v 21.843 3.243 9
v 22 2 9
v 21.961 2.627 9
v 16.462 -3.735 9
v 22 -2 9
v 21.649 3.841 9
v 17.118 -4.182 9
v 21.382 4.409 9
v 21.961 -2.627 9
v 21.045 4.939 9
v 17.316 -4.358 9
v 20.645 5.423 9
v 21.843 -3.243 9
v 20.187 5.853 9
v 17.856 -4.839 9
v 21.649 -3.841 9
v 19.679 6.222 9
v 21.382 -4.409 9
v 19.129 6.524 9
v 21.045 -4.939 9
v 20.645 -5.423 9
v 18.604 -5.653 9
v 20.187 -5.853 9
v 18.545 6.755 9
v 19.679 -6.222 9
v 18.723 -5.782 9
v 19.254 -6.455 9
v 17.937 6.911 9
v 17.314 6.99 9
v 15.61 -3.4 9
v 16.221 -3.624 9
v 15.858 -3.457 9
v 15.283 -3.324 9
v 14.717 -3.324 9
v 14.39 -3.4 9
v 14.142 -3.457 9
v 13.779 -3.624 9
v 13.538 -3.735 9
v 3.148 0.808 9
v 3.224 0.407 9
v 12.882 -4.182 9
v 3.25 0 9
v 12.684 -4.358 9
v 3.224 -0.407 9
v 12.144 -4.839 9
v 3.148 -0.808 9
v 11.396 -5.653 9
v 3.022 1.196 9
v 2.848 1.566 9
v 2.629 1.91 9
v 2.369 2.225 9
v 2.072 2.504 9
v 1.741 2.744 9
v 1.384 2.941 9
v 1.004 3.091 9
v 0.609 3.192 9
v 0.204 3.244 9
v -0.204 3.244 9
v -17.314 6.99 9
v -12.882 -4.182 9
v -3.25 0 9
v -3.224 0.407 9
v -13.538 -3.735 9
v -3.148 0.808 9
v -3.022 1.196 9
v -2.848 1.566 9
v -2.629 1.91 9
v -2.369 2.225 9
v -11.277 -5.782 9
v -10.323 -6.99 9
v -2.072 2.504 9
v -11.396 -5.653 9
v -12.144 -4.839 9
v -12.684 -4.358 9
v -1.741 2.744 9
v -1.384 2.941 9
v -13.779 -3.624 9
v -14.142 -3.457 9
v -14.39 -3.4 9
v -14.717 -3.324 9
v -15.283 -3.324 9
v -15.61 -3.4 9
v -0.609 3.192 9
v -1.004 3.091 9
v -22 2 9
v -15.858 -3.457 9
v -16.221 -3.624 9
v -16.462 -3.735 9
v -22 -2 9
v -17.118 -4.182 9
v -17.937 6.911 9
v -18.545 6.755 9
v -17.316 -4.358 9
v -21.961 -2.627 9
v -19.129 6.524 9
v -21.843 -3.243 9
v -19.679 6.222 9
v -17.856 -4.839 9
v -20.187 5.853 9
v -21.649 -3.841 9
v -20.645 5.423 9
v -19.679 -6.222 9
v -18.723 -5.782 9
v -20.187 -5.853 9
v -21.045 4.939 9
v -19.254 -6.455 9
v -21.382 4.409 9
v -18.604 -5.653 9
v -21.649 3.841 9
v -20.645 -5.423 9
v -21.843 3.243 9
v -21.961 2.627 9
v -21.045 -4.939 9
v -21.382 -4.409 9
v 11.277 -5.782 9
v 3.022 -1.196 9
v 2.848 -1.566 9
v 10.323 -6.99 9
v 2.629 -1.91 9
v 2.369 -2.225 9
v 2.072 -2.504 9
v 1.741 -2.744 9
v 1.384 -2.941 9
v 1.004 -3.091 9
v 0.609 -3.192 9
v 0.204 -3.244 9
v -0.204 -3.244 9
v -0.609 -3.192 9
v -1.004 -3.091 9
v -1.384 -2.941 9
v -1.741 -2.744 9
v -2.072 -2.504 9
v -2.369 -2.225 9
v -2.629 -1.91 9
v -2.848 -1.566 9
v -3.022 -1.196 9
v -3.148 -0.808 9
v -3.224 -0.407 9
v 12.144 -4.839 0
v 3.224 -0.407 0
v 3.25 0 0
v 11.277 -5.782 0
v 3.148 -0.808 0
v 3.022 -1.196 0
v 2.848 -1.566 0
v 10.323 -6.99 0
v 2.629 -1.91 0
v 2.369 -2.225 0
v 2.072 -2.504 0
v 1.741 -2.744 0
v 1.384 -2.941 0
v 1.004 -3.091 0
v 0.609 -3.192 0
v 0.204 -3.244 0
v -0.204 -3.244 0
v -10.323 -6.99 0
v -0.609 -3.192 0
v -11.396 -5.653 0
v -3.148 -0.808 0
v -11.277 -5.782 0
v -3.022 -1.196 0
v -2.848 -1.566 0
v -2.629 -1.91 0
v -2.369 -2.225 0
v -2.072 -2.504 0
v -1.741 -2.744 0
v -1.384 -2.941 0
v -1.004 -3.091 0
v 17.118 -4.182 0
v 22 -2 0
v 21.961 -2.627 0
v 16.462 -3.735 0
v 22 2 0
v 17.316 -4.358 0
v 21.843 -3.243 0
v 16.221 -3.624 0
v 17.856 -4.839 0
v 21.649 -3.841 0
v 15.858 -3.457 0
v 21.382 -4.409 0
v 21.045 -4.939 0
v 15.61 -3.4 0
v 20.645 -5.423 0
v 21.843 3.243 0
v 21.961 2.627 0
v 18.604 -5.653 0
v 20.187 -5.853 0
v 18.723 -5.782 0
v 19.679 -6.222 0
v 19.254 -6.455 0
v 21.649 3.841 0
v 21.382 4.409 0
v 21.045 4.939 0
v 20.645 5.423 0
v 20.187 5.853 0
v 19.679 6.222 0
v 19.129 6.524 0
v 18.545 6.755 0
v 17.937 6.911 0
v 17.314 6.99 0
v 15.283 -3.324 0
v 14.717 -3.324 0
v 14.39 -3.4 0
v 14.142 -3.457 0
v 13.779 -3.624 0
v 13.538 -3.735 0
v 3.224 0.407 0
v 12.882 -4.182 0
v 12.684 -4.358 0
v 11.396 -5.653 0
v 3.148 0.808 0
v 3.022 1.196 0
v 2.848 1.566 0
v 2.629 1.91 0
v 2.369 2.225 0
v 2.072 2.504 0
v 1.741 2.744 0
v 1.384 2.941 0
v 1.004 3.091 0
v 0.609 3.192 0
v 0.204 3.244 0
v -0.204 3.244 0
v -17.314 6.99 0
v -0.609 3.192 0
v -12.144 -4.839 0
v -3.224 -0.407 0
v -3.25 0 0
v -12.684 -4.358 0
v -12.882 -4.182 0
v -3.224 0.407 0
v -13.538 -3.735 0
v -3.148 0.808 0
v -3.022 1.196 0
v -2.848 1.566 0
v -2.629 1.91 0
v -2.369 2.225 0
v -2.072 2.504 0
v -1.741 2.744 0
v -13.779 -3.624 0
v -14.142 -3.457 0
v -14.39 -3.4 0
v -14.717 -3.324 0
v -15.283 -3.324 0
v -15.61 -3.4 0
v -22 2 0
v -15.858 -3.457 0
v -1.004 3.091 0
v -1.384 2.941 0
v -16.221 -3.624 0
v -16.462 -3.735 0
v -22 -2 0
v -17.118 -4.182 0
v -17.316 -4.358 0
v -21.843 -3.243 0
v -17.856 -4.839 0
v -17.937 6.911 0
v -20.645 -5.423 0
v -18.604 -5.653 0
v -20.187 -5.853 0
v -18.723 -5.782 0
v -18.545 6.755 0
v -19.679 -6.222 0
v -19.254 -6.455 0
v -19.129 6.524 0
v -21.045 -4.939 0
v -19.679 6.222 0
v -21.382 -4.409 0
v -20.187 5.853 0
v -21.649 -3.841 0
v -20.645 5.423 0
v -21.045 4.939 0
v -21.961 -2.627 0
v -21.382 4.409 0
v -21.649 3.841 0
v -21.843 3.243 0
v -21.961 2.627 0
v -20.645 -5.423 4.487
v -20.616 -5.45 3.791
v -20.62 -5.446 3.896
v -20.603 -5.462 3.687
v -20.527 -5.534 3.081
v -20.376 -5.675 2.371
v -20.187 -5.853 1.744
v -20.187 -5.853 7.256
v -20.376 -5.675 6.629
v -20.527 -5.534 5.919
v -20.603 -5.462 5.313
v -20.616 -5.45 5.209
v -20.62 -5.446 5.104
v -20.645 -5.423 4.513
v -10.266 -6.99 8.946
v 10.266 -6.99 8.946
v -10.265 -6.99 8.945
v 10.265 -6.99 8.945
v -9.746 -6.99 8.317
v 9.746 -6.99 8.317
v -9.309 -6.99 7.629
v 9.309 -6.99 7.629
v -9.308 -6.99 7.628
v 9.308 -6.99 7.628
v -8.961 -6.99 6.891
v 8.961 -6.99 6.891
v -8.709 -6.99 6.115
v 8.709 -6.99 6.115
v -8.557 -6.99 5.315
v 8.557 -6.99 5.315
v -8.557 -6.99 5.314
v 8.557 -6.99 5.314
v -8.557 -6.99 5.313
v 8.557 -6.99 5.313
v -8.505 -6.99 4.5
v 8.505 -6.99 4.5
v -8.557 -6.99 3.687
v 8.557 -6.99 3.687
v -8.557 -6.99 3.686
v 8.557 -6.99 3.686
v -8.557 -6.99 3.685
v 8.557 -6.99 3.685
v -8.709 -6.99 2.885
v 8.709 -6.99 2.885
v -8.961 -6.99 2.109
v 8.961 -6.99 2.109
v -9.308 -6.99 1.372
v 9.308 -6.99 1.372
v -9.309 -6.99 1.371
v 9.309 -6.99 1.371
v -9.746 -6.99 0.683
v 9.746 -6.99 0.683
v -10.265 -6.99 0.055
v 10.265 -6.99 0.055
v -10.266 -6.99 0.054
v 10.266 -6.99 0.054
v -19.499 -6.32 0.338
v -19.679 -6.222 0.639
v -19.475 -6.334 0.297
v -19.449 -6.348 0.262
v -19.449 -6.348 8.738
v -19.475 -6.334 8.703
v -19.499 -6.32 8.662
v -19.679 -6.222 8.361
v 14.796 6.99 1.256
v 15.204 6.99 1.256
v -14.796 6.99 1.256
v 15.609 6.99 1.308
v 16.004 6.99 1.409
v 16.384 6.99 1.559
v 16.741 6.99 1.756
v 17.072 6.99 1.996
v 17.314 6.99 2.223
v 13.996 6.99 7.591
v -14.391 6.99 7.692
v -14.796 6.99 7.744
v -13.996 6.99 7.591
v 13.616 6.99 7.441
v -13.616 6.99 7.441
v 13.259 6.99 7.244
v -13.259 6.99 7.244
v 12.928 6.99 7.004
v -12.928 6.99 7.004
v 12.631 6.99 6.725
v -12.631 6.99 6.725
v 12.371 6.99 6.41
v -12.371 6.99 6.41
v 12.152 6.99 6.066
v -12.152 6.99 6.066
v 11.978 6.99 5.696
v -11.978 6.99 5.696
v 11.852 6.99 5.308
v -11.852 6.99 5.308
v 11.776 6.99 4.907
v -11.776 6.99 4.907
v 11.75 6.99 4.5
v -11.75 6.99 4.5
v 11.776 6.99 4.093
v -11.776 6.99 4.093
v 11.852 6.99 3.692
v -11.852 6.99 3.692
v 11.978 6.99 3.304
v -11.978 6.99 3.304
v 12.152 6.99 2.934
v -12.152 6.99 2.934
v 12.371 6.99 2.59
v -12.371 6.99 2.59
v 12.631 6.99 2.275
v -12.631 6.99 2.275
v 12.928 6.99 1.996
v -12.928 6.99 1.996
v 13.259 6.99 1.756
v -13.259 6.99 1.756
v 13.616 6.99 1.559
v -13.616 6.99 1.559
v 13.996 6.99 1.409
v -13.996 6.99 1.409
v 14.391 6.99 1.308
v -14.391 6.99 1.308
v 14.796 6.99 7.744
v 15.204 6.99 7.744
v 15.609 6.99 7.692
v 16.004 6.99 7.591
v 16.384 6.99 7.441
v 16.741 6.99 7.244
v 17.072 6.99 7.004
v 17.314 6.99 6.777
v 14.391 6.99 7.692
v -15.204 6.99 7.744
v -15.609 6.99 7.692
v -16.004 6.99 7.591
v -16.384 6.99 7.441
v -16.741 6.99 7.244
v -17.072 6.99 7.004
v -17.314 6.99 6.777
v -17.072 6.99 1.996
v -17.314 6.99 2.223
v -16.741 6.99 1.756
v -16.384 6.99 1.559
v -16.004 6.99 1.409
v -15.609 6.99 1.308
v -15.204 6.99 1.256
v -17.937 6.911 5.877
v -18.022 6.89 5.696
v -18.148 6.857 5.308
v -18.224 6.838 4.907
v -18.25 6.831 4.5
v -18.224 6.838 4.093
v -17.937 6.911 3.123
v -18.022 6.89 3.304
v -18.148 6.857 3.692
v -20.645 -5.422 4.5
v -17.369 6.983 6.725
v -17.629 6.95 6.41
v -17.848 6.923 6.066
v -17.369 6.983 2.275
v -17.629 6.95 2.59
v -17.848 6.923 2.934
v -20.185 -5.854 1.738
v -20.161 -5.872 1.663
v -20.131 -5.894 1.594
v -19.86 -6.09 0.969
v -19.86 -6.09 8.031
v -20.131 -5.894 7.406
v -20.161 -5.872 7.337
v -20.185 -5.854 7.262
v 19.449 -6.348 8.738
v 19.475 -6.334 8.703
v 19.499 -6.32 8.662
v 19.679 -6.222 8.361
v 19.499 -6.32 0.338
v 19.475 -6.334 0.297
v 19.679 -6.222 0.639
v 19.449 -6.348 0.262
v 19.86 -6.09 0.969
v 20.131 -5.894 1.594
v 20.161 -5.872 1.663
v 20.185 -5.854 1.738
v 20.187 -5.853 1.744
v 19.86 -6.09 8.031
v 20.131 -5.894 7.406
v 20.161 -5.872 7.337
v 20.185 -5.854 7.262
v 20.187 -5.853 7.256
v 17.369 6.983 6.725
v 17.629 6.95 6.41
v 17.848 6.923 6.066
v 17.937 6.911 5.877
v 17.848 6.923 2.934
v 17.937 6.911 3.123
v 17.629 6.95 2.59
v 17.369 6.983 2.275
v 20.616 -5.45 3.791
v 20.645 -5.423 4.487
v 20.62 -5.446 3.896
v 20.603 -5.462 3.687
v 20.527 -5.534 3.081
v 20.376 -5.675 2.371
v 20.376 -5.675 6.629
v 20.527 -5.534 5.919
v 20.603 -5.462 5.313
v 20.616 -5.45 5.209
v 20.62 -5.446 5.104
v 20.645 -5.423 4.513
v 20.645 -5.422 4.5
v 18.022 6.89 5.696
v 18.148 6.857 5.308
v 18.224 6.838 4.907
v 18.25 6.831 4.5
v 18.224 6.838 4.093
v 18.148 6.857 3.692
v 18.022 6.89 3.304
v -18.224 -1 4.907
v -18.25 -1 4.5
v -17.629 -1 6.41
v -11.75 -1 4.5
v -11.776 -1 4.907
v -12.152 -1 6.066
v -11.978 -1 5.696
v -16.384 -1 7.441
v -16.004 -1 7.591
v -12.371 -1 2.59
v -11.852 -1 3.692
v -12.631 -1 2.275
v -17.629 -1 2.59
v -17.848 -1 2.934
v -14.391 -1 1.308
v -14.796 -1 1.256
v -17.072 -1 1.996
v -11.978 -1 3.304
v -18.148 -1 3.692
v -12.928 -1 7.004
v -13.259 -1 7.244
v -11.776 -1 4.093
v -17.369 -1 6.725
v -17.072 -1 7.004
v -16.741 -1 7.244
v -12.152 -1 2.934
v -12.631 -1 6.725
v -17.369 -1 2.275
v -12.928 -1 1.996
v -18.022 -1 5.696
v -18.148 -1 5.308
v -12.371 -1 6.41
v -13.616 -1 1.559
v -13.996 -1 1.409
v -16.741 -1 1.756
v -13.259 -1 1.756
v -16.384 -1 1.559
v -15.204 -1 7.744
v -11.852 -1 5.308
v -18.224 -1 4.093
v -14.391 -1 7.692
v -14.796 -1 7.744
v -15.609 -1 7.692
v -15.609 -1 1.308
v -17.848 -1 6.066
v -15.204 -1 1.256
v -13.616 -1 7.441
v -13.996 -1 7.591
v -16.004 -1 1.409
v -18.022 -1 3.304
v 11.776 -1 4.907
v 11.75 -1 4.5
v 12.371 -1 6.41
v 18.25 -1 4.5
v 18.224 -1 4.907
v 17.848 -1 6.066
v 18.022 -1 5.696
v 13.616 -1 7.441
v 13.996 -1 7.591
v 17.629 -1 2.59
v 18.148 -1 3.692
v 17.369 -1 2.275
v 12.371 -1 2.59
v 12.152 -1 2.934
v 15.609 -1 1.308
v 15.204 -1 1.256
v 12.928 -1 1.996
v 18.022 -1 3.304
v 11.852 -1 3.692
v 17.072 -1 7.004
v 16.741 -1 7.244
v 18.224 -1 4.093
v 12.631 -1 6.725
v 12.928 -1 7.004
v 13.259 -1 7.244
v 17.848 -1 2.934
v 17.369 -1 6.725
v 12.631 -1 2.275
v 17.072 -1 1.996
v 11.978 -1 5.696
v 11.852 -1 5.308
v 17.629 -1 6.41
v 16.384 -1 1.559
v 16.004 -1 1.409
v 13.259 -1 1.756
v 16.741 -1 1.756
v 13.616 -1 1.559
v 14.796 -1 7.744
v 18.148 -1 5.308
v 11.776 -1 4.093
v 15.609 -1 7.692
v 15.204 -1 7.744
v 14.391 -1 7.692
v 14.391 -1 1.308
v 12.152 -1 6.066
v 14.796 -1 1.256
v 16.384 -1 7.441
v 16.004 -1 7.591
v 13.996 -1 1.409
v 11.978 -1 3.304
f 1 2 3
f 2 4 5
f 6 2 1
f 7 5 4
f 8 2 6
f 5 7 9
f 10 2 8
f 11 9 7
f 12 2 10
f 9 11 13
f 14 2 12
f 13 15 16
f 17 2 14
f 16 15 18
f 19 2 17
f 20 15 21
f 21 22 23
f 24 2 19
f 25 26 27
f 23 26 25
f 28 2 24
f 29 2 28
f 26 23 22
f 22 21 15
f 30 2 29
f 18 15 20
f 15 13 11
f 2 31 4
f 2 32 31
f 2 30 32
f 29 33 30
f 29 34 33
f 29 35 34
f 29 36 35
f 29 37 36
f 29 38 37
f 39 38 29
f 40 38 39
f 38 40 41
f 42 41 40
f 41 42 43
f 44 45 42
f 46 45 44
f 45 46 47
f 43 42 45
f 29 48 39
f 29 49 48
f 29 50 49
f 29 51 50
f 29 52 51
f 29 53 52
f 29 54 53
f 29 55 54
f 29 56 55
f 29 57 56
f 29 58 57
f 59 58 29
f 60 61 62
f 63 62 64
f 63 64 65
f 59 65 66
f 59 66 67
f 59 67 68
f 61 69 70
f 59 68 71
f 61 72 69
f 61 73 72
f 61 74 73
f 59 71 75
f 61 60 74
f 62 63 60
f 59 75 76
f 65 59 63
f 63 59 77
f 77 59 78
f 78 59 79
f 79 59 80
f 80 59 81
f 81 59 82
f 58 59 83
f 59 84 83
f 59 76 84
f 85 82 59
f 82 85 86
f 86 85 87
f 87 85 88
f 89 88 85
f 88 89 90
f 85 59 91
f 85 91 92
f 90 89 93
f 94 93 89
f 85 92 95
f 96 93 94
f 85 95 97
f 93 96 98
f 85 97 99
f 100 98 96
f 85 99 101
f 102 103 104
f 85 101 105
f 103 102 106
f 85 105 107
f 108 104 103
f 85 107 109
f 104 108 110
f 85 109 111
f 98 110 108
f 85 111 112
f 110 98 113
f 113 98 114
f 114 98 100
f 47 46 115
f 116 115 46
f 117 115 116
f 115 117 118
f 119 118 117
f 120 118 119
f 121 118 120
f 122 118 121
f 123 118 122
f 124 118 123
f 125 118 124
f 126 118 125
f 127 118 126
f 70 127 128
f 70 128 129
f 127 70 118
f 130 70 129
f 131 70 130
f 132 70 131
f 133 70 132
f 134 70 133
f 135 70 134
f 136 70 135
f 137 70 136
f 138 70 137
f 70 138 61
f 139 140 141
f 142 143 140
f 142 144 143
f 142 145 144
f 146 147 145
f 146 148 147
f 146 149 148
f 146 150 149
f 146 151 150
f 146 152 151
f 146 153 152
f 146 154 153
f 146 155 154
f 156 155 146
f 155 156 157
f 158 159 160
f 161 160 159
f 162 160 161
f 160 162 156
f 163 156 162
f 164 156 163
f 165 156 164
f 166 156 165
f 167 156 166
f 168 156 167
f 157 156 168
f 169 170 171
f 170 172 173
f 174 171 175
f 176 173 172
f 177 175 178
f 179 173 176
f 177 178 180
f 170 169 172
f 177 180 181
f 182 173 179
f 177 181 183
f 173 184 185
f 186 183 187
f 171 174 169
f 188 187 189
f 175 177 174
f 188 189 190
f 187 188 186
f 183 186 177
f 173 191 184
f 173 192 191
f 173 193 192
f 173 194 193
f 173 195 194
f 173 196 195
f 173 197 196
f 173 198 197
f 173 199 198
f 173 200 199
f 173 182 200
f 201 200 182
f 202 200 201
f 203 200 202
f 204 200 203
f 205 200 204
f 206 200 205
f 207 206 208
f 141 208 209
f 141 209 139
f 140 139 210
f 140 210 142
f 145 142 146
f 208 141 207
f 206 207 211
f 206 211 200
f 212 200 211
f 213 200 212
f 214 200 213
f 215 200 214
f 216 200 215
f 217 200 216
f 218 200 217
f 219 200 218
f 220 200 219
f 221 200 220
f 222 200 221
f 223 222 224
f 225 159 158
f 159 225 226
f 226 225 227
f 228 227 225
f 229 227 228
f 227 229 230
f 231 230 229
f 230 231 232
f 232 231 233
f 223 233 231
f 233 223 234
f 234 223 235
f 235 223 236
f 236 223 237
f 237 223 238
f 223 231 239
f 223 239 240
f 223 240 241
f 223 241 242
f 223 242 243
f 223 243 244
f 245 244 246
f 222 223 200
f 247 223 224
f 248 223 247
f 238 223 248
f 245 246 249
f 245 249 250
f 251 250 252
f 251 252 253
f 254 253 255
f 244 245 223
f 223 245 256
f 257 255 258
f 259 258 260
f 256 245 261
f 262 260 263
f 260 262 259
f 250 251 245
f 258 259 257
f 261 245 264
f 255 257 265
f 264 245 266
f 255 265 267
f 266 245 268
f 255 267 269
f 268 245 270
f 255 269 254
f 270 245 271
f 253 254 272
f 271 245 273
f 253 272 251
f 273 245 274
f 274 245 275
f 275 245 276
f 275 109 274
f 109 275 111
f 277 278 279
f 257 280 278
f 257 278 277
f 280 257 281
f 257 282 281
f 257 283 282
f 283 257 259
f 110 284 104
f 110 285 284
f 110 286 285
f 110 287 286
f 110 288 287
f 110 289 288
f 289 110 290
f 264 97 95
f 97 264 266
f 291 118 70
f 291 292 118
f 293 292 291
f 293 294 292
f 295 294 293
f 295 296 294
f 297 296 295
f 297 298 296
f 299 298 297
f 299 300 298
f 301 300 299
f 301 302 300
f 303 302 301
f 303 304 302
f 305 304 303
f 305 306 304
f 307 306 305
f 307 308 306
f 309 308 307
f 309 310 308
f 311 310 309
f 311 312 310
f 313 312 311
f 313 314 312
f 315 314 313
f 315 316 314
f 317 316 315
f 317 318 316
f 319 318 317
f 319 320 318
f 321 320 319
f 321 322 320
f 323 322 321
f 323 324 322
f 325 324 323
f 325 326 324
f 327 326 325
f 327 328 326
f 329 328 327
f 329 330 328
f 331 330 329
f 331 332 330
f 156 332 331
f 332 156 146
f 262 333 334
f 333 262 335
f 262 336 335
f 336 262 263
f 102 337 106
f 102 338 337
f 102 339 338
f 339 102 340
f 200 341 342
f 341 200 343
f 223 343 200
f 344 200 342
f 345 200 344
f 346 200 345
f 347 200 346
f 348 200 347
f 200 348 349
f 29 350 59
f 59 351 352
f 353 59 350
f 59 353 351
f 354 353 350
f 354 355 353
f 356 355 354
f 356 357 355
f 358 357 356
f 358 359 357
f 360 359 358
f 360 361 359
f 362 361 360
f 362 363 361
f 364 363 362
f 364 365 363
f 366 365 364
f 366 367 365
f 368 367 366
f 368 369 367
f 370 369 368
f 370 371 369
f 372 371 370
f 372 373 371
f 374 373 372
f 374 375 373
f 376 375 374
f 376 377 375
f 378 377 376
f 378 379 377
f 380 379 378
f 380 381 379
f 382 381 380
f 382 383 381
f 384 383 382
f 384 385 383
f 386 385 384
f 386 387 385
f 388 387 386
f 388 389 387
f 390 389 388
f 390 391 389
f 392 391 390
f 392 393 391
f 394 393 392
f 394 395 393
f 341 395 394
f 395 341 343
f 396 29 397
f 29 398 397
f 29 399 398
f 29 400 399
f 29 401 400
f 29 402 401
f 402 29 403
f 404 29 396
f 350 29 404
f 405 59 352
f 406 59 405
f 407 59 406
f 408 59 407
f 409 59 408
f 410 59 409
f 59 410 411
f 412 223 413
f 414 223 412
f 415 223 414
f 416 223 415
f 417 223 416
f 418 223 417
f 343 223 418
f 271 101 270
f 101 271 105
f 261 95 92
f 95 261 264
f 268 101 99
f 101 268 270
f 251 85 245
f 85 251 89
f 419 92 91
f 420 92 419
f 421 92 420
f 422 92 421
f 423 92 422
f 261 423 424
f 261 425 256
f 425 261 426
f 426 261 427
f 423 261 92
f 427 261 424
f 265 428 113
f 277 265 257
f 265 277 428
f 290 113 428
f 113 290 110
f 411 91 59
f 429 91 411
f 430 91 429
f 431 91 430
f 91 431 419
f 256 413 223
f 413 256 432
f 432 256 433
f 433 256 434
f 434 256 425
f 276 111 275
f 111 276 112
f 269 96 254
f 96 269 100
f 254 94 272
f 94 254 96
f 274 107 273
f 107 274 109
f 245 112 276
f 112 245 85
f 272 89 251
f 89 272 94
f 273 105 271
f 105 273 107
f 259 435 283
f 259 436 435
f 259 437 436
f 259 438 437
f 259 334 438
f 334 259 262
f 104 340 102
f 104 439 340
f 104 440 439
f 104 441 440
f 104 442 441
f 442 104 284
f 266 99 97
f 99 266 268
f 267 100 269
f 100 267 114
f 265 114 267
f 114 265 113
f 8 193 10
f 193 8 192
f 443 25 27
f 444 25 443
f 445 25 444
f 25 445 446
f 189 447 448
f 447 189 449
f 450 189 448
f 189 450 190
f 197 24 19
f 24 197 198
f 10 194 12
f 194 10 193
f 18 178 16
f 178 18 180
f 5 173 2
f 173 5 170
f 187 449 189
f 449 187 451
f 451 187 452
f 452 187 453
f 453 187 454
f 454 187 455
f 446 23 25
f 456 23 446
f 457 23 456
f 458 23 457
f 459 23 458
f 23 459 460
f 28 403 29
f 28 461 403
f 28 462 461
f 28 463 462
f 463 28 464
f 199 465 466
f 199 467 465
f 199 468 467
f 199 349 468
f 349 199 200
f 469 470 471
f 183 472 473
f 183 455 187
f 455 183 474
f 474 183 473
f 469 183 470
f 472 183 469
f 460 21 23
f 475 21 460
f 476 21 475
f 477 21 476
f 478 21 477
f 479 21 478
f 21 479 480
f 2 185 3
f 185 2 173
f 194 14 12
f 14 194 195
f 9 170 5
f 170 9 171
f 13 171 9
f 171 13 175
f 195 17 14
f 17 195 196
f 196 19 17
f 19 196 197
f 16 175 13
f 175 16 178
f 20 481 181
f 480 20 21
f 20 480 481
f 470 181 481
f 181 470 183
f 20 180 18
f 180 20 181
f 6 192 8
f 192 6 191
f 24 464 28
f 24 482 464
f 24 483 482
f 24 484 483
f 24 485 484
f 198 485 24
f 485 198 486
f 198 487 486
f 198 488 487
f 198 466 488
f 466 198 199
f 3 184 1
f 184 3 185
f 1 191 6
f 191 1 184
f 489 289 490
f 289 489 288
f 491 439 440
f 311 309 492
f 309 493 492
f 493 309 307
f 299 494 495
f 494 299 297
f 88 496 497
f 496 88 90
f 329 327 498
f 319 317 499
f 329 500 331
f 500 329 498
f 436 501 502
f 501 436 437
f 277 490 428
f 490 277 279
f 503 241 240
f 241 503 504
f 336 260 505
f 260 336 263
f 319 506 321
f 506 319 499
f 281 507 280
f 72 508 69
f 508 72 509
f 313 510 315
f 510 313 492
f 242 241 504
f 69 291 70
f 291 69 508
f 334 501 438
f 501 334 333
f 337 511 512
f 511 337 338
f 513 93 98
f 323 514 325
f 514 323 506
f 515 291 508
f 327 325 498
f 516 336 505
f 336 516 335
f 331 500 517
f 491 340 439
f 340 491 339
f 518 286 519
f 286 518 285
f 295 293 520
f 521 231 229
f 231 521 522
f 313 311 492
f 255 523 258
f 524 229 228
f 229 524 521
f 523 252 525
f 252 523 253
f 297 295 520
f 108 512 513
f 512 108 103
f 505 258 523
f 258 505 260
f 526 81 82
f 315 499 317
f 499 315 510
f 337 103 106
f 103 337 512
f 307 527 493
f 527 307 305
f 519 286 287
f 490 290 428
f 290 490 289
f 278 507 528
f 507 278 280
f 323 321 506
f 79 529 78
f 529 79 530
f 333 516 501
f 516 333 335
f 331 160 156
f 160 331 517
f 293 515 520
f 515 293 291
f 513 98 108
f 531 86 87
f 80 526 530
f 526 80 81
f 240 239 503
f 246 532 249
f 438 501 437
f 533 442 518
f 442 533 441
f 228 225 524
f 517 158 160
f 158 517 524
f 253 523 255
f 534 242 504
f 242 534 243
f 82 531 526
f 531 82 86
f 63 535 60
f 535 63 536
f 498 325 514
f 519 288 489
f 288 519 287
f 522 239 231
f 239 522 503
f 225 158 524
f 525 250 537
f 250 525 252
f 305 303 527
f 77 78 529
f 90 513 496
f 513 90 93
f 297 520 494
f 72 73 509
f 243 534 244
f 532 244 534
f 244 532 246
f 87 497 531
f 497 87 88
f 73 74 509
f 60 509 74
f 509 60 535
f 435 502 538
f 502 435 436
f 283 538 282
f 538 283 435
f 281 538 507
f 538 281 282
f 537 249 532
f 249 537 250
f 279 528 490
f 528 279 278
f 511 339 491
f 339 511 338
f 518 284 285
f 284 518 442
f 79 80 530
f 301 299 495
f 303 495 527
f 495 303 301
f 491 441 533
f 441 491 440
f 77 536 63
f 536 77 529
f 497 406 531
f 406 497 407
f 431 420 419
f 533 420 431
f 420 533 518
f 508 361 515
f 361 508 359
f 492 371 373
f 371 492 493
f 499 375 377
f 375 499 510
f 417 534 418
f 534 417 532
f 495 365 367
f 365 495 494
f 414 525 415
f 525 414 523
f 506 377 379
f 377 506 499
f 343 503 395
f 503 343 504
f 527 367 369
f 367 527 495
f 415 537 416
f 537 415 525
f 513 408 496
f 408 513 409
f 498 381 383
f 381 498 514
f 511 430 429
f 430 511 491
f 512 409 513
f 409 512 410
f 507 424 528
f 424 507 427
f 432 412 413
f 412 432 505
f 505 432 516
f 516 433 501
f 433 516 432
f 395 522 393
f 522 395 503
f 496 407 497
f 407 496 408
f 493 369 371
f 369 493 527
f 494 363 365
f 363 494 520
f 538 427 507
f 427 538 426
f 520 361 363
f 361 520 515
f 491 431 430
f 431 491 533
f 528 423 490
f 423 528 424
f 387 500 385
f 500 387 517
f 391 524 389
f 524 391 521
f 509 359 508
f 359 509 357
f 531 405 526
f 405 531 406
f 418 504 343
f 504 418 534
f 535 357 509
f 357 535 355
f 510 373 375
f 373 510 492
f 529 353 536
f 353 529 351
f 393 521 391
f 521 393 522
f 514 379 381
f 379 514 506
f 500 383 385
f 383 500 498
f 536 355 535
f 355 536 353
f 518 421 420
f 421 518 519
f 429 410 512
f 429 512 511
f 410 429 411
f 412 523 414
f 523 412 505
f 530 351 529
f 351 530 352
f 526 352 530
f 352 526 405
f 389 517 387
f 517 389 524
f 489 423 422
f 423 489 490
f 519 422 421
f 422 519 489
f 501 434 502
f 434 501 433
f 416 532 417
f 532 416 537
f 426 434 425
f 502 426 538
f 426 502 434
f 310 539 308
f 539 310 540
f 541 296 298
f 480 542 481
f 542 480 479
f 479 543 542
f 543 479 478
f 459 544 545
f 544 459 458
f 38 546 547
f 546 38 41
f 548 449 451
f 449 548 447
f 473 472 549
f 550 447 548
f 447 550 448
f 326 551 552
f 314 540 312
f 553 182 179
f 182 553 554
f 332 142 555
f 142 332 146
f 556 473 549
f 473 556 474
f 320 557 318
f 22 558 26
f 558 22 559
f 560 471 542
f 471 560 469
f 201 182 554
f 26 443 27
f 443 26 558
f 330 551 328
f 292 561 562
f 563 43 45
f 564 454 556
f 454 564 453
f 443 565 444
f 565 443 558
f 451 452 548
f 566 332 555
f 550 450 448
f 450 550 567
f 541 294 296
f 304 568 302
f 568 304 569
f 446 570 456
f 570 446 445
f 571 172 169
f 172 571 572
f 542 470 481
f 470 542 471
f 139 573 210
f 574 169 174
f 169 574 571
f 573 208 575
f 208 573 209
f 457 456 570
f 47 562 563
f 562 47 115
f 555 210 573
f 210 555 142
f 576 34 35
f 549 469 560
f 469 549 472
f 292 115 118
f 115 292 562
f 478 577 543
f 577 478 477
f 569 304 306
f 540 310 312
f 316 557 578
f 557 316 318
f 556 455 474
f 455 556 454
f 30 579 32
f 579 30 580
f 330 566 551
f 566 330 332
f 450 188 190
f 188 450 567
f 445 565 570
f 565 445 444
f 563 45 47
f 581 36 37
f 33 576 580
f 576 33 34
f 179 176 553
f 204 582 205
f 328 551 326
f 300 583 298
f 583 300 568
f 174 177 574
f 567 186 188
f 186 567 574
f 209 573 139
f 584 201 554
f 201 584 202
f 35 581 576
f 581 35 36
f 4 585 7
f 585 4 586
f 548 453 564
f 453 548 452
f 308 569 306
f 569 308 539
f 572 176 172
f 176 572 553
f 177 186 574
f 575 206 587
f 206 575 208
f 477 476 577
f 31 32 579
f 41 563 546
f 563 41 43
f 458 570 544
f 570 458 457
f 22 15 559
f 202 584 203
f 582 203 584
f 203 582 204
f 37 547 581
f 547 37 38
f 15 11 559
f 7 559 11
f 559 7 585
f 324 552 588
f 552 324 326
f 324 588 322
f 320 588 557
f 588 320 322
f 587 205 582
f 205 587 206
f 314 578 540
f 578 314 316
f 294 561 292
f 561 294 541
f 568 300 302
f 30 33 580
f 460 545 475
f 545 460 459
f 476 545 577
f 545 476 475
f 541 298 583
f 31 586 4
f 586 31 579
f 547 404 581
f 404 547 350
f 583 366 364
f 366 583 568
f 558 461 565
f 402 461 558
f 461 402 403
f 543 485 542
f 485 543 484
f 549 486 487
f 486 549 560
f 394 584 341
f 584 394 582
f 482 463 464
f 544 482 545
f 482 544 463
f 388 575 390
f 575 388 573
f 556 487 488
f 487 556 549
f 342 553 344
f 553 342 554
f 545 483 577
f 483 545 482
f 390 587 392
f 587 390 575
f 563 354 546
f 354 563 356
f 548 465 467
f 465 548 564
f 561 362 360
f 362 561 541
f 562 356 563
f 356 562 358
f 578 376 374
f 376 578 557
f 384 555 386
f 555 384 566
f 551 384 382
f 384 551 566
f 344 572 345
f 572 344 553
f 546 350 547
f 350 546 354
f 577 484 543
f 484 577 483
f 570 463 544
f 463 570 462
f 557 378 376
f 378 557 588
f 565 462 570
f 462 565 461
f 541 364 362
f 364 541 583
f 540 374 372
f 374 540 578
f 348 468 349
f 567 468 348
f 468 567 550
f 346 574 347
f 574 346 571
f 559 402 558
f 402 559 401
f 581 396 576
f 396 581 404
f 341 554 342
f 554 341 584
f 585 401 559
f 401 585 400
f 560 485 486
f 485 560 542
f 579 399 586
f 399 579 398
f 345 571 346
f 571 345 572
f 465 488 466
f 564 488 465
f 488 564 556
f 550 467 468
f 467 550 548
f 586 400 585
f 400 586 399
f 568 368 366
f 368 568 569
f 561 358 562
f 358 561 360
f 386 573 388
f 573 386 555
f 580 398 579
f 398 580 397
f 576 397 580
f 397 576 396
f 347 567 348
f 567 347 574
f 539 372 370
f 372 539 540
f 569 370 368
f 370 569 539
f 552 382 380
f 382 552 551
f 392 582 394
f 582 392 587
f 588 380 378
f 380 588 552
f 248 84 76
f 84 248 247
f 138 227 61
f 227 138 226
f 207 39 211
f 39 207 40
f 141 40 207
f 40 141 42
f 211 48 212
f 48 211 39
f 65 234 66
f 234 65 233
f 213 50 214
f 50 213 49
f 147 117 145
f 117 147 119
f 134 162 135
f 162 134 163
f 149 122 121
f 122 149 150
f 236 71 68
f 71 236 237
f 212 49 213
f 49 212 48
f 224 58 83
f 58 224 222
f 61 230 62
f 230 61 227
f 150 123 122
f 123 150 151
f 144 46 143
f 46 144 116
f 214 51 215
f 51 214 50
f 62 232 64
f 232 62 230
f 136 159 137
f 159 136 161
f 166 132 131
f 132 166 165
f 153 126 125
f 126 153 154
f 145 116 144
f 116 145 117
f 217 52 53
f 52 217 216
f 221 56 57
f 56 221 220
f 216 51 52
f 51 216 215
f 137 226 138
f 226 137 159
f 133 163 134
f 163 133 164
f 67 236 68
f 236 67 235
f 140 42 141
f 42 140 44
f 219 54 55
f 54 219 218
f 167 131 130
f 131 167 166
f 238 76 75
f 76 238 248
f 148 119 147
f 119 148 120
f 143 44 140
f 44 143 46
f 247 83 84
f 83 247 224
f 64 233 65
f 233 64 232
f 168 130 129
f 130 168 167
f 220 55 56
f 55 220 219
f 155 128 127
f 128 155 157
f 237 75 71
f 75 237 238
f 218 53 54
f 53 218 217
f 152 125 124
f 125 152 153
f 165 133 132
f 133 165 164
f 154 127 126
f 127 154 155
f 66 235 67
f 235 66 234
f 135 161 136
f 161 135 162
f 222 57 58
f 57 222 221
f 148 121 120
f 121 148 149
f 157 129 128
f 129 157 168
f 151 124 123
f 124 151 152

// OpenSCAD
$fn = 50;


difference() {
	union() {
		cylinder(h = 9, r = 7.0000000000);
		translate(v = [-7.5000000000, 0.0000000000, 0]) {
			hull() {
				translate(v = [-9.5000000000, 2.0000000000, 0]) {
					cylinder(h = 9, r = 5);
				}
				translate(v = [9.5000000000, 2.0000000000, 0]) {
					cylinder(h = 9, r = 5);
				}
				translate(v = [-9.5000000000, -2.0000000000, 0]) {
					cylinder(h = 9, r = 5);
				}
				translate(v = [9.5000000000, -2.0000000000, 0]) {
					cylinder(h = 9, r = 5);
				}
			}
		}
		translate(v = [7.5000000000, 0.0000000000, 0]) {
			hull() {
				translate(v = [-9.5000000000, 2.0000000000, 0]) {
					cylinder(h = 9, r = 5);
				}
				translate(v = [9.5000000000, 2.0000000000, 0]) {
					cylinder(h = 9, r = 5);
				}
				translate(v = [-9.5000000000, -2.0000000000, 0]) {
					cylinder(h = 9, r = 5);
				}
				translate(v = [9.5000000000, -2.0000000000, 0]) {
					cylinder(h = 9, r = 5);
				}
			}
		}
	}
	union() {
		translate(v = [-15.0000000000, -7.0000000000, 4.5000000000]) {
			rotate(a = [90, 0, 0]) {
				difference() {
					union() {
						#translate(v = [0, 0, -14.0000000000]) {
							cylinder(h = 14, r = 2.2500000000);
						}
						#translate(v = [0, 0, -6]) {
							cylinder(h = 6, r1 = 3.2500000000, r2 = 6.5000000000);
						}
						#translate(v = [0, 0, -14.0000000000]) {
							cylinder(h = 14, r = 3.2500000000);
						}
						#translate(v = [0, 0, -14.0000000000]) {
							cylinder(h = 14, r = 2.2500000000);
						}
					}
					union();
				}
			}
		}
		translate(v = [15.0000000000, -7.0000000000, 4.5000000000]) {
			rotate(a = [90, 0, 0]) {
				difference() {
					union() {
						#translate(v = [0, 0, -14.0000000000]) {
							cylinder(h = 14, r = 2.2500000000);
						}
						#translate(v = [0, 0, -6]) {
							cylinder(h = 6, r1 = 3.2500000000, r2 = 6.5000000000);
						}
						#translate(v = [0, 0, -14.0000000000]) {
							cylinder(h = 14, r = 3.2500000000);
						}
						#translate(v = [0, 0, -14.0000000000]) {
							cylinder(h = 14, r = 2.2500000000);
						}
					}
					union();
				}
			}
		}
		translate(v = [0, 0, -100]) {
			cylinder(h = 200, r = 3.2500000000);
		}
		translate(v = [0, 0, -100]) {
			cylinder(h = 200, r = 1.8000000000);
		}
	}
}
